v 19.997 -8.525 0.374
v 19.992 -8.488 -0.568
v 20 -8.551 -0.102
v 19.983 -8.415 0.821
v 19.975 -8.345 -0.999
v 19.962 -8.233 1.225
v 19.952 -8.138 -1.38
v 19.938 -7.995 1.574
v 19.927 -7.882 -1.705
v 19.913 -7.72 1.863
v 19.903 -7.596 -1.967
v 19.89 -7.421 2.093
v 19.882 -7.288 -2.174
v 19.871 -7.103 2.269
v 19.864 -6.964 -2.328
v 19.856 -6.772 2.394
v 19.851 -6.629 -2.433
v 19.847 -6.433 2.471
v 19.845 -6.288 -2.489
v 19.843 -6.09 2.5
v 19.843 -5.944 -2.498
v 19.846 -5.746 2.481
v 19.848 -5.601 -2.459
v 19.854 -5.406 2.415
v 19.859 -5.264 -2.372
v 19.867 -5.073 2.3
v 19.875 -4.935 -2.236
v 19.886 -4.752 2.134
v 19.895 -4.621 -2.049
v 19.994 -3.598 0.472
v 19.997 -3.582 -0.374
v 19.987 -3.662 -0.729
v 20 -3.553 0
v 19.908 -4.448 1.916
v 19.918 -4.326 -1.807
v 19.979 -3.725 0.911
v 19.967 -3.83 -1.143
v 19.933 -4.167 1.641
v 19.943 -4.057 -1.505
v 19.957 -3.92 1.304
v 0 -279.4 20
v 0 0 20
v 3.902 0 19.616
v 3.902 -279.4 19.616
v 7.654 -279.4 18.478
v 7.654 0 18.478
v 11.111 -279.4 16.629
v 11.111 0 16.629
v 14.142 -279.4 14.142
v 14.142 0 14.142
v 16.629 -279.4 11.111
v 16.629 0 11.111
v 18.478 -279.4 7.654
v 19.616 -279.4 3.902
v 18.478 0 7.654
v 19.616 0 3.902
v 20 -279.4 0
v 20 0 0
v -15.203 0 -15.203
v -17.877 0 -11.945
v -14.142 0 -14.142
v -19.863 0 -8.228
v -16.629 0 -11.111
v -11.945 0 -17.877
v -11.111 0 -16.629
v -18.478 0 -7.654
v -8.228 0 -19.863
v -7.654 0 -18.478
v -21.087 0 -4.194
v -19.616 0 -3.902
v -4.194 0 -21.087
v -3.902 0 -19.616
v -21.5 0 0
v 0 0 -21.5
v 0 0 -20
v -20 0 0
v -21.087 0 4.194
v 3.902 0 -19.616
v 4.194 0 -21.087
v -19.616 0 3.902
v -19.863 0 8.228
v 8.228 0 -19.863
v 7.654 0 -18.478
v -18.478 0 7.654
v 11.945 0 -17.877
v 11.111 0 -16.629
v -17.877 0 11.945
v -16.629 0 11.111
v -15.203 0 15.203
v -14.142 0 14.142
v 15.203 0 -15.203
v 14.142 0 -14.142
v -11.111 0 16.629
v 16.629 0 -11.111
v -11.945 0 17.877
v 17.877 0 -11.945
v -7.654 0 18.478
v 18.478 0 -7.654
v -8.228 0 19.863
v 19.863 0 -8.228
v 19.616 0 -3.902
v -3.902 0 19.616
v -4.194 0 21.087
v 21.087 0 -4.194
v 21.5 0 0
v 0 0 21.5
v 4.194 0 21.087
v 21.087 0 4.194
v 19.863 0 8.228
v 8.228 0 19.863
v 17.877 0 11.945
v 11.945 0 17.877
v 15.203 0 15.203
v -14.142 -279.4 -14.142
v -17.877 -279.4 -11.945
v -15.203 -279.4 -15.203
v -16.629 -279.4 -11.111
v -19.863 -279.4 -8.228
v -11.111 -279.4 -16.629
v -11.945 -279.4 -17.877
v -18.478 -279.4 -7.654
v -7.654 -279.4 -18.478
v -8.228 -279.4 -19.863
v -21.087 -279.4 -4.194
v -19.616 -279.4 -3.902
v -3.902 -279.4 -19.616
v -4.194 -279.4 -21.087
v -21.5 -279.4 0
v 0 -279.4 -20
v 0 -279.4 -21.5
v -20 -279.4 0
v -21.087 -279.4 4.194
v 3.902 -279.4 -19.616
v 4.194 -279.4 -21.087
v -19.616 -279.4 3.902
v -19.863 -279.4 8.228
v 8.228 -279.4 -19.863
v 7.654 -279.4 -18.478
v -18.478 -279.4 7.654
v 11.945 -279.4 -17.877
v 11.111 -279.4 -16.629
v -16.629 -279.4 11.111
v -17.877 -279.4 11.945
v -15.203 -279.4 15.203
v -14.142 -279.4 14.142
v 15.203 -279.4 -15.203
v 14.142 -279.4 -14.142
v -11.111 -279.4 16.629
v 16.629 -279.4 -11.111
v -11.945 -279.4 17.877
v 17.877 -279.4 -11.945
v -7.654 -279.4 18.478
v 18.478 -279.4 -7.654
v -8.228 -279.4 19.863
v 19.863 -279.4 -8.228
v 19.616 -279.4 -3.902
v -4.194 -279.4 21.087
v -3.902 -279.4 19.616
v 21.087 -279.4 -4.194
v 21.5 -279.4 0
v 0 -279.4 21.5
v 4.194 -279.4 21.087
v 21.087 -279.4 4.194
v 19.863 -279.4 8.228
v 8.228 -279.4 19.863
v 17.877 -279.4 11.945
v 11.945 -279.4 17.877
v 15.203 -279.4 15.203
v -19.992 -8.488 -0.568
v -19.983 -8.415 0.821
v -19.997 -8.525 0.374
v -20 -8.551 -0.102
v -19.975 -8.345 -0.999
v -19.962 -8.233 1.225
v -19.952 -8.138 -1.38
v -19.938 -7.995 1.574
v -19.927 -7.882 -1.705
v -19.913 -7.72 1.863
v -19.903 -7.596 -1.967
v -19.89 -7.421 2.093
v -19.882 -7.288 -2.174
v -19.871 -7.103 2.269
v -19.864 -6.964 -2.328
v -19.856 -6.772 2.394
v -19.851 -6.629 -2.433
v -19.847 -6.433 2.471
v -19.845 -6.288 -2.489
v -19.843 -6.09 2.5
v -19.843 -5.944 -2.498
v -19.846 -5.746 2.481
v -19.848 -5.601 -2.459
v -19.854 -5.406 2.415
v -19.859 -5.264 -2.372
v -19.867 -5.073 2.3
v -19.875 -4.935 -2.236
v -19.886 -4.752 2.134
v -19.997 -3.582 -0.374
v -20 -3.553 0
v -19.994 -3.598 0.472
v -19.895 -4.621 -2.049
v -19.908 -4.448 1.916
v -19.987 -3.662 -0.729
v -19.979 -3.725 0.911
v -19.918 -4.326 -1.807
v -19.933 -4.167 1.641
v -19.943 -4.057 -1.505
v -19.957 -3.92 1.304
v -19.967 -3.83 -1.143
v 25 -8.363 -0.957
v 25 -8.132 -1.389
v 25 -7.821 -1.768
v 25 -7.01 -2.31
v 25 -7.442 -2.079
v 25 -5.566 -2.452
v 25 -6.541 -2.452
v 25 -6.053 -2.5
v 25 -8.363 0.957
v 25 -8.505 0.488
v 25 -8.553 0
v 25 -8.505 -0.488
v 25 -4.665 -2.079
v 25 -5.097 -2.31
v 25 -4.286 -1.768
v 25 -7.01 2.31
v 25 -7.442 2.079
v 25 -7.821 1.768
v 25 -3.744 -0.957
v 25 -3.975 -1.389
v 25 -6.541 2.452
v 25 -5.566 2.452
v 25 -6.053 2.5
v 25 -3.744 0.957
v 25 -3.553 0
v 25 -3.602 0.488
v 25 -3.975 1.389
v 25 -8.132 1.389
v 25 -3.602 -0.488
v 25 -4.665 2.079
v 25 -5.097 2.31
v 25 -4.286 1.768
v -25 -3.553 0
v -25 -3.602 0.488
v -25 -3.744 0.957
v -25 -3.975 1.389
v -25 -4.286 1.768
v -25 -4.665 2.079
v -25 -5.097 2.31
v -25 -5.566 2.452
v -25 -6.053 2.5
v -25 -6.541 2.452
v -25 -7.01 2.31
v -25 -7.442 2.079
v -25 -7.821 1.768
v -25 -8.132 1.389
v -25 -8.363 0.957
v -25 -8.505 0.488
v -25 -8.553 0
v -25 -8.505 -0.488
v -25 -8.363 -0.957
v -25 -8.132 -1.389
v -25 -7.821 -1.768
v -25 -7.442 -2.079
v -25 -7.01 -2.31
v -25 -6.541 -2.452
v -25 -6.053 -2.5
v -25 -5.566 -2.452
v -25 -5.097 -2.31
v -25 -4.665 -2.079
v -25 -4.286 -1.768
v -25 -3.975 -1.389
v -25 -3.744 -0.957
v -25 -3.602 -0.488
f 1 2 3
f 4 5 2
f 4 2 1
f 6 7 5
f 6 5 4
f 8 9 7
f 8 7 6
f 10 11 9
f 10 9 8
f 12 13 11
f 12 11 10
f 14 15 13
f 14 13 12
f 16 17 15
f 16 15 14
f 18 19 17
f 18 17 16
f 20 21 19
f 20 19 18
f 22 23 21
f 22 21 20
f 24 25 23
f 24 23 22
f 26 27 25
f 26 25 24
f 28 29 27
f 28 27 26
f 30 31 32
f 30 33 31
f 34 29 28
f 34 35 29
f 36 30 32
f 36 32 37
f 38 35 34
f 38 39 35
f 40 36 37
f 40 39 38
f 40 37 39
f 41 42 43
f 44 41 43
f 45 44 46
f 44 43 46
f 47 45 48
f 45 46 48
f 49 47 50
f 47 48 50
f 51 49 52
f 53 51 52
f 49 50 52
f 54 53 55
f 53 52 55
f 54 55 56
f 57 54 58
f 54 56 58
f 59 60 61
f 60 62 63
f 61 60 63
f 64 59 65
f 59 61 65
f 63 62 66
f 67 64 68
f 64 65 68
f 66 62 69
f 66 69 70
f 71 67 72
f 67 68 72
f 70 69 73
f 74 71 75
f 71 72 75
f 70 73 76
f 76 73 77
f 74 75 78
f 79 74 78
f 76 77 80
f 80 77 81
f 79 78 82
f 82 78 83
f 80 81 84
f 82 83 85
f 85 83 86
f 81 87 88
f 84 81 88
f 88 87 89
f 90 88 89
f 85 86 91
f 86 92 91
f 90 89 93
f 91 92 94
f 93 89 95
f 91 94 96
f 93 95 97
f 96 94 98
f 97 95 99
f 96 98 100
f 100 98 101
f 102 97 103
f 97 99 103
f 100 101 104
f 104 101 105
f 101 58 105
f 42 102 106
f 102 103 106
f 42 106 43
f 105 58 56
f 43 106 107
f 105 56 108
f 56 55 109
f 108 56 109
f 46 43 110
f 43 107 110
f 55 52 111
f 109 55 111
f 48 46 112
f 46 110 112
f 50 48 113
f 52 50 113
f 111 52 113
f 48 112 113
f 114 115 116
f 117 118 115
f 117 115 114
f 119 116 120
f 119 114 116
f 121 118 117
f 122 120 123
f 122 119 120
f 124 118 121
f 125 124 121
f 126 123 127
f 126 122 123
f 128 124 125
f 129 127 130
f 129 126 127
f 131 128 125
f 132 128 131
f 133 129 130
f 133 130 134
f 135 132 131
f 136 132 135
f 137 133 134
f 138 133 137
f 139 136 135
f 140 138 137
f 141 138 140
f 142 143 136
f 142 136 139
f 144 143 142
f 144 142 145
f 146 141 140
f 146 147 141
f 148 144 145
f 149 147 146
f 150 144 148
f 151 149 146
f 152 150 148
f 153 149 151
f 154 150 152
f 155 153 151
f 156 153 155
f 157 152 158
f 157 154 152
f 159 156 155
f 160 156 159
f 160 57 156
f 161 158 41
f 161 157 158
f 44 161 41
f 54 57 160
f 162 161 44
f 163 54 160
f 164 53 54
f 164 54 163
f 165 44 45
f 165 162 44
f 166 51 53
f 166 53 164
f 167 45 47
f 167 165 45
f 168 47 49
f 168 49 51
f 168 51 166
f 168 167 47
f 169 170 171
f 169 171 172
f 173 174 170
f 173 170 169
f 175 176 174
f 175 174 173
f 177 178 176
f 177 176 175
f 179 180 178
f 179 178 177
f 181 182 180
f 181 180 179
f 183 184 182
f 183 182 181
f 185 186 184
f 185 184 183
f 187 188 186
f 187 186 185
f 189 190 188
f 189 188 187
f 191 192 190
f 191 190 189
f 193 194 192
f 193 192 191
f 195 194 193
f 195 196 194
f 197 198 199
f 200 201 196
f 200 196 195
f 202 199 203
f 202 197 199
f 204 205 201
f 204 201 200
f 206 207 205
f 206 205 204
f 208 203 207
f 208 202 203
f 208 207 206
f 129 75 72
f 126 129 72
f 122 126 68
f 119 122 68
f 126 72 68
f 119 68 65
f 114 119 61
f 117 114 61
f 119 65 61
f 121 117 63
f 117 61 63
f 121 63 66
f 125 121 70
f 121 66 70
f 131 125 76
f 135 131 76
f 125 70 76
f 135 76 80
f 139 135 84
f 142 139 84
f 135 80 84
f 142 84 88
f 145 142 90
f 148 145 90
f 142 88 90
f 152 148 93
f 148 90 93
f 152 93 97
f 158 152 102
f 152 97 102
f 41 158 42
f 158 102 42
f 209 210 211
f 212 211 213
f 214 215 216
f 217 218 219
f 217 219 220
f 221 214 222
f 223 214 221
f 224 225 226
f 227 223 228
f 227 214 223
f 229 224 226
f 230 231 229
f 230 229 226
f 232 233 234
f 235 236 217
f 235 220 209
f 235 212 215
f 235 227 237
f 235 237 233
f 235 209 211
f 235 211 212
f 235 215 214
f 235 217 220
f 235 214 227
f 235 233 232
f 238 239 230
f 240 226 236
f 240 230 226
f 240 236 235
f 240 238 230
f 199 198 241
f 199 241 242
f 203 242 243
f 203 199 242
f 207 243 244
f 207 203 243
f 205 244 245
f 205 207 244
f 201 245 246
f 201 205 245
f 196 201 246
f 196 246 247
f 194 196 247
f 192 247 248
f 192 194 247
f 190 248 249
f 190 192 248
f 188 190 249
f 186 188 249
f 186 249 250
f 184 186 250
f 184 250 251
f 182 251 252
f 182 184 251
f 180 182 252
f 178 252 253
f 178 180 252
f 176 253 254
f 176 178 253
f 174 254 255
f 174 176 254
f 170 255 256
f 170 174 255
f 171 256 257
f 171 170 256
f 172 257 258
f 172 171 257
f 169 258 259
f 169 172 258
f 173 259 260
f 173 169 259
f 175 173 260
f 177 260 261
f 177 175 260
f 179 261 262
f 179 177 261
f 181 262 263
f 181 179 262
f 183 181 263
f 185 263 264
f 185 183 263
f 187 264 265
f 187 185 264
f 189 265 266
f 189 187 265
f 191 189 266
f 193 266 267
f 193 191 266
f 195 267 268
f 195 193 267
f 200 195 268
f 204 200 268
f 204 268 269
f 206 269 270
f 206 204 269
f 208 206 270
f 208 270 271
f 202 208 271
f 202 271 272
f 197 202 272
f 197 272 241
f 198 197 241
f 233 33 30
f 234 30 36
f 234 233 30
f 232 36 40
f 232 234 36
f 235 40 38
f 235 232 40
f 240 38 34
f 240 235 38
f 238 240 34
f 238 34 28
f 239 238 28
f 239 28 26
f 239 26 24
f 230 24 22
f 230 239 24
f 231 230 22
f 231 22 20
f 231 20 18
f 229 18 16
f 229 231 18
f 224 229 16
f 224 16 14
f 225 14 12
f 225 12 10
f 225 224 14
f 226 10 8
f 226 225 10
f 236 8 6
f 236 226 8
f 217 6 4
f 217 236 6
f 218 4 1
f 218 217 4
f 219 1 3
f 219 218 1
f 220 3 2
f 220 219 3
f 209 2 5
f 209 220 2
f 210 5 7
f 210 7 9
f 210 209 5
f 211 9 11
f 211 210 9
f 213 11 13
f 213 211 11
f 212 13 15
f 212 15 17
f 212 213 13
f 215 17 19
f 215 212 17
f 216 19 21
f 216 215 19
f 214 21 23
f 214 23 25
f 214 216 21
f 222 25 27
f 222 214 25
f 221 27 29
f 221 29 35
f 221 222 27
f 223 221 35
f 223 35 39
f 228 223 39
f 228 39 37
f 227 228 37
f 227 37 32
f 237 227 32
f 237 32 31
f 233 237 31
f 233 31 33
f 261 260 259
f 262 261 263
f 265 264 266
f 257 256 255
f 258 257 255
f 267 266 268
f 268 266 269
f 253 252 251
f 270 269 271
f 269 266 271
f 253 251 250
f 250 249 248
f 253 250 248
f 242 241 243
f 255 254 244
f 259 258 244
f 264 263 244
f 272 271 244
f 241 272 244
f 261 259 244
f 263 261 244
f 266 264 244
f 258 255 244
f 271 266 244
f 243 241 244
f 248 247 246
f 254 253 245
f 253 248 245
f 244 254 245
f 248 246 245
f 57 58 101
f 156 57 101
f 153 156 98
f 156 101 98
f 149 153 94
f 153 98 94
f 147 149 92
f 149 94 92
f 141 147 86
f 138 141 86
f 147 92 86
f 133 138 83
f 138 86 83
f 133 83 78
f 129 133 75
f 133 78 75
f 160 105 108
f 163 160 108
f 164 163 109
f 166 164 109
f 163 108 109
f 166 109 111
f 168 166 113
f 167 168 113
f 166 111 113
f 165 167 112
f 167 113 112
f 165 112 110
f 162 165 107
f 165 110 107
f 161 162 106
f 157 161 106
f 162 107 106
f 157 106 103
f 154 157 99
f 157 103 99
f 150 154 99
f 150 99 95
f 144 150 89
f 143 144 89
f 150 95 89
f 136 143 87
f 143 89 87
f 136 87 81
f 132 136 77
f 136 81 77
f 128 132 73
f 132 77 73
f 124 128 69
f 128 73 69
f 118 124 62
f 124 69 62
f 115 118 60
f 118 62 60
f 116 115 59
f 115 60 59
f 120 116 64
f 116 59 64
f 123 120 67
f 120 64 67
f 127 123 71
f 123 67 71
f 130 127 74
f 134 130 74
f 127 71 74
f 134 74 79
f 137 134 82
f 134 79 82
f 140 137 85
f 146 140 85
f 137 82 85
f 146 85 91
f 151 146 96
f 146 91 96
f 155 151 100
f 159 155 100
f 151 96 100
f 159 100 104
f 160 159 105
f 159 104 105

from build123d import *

# Parameters (mm, degrees)
F0_R     = 2.5
F1_DEPTH = 25
F2_R     = 21.5
F3_DEPTH = 279.4
F4_R     = 20
F5_DEPTH = 21.336


with BuildPart() as f1:
    # F0 (on Right) → F1 (new body, symmetric)
    with BuildSketch(Plane.YZ):
        with Locations((-6.053488, 0)):
            Circle(F0_R)
    extrude(amount=F1_DEPTH, both=True)

    # F4 (on Front) → F5 (cut)
    with BuildSketch(Plane.XZ):
        Circle(F4_R)
    extrude(amount=F5_DEPTH, mode=Mode.SUBTRACT)


with BuildPart() as f3:
    # F2 (on Front) → F3 (new body)
    with BuildSketch(Plane.XZ):
        Circle(F2_R)
        with BuildLine():
            ThreePointArc((0, 20), (14.142136, 14.142136), (20, 0))
            ThreePointArc((20, 0), (14.142136, -14.142136), (0, -20))
            ThreePointArc((0, -20), (-20, 0), (0, 20))
        make_face(mode=Mode.SUBTRACT)
    extrude(amount=F3_DEPTH)


solid = Compound([f1.part, f3.part])
